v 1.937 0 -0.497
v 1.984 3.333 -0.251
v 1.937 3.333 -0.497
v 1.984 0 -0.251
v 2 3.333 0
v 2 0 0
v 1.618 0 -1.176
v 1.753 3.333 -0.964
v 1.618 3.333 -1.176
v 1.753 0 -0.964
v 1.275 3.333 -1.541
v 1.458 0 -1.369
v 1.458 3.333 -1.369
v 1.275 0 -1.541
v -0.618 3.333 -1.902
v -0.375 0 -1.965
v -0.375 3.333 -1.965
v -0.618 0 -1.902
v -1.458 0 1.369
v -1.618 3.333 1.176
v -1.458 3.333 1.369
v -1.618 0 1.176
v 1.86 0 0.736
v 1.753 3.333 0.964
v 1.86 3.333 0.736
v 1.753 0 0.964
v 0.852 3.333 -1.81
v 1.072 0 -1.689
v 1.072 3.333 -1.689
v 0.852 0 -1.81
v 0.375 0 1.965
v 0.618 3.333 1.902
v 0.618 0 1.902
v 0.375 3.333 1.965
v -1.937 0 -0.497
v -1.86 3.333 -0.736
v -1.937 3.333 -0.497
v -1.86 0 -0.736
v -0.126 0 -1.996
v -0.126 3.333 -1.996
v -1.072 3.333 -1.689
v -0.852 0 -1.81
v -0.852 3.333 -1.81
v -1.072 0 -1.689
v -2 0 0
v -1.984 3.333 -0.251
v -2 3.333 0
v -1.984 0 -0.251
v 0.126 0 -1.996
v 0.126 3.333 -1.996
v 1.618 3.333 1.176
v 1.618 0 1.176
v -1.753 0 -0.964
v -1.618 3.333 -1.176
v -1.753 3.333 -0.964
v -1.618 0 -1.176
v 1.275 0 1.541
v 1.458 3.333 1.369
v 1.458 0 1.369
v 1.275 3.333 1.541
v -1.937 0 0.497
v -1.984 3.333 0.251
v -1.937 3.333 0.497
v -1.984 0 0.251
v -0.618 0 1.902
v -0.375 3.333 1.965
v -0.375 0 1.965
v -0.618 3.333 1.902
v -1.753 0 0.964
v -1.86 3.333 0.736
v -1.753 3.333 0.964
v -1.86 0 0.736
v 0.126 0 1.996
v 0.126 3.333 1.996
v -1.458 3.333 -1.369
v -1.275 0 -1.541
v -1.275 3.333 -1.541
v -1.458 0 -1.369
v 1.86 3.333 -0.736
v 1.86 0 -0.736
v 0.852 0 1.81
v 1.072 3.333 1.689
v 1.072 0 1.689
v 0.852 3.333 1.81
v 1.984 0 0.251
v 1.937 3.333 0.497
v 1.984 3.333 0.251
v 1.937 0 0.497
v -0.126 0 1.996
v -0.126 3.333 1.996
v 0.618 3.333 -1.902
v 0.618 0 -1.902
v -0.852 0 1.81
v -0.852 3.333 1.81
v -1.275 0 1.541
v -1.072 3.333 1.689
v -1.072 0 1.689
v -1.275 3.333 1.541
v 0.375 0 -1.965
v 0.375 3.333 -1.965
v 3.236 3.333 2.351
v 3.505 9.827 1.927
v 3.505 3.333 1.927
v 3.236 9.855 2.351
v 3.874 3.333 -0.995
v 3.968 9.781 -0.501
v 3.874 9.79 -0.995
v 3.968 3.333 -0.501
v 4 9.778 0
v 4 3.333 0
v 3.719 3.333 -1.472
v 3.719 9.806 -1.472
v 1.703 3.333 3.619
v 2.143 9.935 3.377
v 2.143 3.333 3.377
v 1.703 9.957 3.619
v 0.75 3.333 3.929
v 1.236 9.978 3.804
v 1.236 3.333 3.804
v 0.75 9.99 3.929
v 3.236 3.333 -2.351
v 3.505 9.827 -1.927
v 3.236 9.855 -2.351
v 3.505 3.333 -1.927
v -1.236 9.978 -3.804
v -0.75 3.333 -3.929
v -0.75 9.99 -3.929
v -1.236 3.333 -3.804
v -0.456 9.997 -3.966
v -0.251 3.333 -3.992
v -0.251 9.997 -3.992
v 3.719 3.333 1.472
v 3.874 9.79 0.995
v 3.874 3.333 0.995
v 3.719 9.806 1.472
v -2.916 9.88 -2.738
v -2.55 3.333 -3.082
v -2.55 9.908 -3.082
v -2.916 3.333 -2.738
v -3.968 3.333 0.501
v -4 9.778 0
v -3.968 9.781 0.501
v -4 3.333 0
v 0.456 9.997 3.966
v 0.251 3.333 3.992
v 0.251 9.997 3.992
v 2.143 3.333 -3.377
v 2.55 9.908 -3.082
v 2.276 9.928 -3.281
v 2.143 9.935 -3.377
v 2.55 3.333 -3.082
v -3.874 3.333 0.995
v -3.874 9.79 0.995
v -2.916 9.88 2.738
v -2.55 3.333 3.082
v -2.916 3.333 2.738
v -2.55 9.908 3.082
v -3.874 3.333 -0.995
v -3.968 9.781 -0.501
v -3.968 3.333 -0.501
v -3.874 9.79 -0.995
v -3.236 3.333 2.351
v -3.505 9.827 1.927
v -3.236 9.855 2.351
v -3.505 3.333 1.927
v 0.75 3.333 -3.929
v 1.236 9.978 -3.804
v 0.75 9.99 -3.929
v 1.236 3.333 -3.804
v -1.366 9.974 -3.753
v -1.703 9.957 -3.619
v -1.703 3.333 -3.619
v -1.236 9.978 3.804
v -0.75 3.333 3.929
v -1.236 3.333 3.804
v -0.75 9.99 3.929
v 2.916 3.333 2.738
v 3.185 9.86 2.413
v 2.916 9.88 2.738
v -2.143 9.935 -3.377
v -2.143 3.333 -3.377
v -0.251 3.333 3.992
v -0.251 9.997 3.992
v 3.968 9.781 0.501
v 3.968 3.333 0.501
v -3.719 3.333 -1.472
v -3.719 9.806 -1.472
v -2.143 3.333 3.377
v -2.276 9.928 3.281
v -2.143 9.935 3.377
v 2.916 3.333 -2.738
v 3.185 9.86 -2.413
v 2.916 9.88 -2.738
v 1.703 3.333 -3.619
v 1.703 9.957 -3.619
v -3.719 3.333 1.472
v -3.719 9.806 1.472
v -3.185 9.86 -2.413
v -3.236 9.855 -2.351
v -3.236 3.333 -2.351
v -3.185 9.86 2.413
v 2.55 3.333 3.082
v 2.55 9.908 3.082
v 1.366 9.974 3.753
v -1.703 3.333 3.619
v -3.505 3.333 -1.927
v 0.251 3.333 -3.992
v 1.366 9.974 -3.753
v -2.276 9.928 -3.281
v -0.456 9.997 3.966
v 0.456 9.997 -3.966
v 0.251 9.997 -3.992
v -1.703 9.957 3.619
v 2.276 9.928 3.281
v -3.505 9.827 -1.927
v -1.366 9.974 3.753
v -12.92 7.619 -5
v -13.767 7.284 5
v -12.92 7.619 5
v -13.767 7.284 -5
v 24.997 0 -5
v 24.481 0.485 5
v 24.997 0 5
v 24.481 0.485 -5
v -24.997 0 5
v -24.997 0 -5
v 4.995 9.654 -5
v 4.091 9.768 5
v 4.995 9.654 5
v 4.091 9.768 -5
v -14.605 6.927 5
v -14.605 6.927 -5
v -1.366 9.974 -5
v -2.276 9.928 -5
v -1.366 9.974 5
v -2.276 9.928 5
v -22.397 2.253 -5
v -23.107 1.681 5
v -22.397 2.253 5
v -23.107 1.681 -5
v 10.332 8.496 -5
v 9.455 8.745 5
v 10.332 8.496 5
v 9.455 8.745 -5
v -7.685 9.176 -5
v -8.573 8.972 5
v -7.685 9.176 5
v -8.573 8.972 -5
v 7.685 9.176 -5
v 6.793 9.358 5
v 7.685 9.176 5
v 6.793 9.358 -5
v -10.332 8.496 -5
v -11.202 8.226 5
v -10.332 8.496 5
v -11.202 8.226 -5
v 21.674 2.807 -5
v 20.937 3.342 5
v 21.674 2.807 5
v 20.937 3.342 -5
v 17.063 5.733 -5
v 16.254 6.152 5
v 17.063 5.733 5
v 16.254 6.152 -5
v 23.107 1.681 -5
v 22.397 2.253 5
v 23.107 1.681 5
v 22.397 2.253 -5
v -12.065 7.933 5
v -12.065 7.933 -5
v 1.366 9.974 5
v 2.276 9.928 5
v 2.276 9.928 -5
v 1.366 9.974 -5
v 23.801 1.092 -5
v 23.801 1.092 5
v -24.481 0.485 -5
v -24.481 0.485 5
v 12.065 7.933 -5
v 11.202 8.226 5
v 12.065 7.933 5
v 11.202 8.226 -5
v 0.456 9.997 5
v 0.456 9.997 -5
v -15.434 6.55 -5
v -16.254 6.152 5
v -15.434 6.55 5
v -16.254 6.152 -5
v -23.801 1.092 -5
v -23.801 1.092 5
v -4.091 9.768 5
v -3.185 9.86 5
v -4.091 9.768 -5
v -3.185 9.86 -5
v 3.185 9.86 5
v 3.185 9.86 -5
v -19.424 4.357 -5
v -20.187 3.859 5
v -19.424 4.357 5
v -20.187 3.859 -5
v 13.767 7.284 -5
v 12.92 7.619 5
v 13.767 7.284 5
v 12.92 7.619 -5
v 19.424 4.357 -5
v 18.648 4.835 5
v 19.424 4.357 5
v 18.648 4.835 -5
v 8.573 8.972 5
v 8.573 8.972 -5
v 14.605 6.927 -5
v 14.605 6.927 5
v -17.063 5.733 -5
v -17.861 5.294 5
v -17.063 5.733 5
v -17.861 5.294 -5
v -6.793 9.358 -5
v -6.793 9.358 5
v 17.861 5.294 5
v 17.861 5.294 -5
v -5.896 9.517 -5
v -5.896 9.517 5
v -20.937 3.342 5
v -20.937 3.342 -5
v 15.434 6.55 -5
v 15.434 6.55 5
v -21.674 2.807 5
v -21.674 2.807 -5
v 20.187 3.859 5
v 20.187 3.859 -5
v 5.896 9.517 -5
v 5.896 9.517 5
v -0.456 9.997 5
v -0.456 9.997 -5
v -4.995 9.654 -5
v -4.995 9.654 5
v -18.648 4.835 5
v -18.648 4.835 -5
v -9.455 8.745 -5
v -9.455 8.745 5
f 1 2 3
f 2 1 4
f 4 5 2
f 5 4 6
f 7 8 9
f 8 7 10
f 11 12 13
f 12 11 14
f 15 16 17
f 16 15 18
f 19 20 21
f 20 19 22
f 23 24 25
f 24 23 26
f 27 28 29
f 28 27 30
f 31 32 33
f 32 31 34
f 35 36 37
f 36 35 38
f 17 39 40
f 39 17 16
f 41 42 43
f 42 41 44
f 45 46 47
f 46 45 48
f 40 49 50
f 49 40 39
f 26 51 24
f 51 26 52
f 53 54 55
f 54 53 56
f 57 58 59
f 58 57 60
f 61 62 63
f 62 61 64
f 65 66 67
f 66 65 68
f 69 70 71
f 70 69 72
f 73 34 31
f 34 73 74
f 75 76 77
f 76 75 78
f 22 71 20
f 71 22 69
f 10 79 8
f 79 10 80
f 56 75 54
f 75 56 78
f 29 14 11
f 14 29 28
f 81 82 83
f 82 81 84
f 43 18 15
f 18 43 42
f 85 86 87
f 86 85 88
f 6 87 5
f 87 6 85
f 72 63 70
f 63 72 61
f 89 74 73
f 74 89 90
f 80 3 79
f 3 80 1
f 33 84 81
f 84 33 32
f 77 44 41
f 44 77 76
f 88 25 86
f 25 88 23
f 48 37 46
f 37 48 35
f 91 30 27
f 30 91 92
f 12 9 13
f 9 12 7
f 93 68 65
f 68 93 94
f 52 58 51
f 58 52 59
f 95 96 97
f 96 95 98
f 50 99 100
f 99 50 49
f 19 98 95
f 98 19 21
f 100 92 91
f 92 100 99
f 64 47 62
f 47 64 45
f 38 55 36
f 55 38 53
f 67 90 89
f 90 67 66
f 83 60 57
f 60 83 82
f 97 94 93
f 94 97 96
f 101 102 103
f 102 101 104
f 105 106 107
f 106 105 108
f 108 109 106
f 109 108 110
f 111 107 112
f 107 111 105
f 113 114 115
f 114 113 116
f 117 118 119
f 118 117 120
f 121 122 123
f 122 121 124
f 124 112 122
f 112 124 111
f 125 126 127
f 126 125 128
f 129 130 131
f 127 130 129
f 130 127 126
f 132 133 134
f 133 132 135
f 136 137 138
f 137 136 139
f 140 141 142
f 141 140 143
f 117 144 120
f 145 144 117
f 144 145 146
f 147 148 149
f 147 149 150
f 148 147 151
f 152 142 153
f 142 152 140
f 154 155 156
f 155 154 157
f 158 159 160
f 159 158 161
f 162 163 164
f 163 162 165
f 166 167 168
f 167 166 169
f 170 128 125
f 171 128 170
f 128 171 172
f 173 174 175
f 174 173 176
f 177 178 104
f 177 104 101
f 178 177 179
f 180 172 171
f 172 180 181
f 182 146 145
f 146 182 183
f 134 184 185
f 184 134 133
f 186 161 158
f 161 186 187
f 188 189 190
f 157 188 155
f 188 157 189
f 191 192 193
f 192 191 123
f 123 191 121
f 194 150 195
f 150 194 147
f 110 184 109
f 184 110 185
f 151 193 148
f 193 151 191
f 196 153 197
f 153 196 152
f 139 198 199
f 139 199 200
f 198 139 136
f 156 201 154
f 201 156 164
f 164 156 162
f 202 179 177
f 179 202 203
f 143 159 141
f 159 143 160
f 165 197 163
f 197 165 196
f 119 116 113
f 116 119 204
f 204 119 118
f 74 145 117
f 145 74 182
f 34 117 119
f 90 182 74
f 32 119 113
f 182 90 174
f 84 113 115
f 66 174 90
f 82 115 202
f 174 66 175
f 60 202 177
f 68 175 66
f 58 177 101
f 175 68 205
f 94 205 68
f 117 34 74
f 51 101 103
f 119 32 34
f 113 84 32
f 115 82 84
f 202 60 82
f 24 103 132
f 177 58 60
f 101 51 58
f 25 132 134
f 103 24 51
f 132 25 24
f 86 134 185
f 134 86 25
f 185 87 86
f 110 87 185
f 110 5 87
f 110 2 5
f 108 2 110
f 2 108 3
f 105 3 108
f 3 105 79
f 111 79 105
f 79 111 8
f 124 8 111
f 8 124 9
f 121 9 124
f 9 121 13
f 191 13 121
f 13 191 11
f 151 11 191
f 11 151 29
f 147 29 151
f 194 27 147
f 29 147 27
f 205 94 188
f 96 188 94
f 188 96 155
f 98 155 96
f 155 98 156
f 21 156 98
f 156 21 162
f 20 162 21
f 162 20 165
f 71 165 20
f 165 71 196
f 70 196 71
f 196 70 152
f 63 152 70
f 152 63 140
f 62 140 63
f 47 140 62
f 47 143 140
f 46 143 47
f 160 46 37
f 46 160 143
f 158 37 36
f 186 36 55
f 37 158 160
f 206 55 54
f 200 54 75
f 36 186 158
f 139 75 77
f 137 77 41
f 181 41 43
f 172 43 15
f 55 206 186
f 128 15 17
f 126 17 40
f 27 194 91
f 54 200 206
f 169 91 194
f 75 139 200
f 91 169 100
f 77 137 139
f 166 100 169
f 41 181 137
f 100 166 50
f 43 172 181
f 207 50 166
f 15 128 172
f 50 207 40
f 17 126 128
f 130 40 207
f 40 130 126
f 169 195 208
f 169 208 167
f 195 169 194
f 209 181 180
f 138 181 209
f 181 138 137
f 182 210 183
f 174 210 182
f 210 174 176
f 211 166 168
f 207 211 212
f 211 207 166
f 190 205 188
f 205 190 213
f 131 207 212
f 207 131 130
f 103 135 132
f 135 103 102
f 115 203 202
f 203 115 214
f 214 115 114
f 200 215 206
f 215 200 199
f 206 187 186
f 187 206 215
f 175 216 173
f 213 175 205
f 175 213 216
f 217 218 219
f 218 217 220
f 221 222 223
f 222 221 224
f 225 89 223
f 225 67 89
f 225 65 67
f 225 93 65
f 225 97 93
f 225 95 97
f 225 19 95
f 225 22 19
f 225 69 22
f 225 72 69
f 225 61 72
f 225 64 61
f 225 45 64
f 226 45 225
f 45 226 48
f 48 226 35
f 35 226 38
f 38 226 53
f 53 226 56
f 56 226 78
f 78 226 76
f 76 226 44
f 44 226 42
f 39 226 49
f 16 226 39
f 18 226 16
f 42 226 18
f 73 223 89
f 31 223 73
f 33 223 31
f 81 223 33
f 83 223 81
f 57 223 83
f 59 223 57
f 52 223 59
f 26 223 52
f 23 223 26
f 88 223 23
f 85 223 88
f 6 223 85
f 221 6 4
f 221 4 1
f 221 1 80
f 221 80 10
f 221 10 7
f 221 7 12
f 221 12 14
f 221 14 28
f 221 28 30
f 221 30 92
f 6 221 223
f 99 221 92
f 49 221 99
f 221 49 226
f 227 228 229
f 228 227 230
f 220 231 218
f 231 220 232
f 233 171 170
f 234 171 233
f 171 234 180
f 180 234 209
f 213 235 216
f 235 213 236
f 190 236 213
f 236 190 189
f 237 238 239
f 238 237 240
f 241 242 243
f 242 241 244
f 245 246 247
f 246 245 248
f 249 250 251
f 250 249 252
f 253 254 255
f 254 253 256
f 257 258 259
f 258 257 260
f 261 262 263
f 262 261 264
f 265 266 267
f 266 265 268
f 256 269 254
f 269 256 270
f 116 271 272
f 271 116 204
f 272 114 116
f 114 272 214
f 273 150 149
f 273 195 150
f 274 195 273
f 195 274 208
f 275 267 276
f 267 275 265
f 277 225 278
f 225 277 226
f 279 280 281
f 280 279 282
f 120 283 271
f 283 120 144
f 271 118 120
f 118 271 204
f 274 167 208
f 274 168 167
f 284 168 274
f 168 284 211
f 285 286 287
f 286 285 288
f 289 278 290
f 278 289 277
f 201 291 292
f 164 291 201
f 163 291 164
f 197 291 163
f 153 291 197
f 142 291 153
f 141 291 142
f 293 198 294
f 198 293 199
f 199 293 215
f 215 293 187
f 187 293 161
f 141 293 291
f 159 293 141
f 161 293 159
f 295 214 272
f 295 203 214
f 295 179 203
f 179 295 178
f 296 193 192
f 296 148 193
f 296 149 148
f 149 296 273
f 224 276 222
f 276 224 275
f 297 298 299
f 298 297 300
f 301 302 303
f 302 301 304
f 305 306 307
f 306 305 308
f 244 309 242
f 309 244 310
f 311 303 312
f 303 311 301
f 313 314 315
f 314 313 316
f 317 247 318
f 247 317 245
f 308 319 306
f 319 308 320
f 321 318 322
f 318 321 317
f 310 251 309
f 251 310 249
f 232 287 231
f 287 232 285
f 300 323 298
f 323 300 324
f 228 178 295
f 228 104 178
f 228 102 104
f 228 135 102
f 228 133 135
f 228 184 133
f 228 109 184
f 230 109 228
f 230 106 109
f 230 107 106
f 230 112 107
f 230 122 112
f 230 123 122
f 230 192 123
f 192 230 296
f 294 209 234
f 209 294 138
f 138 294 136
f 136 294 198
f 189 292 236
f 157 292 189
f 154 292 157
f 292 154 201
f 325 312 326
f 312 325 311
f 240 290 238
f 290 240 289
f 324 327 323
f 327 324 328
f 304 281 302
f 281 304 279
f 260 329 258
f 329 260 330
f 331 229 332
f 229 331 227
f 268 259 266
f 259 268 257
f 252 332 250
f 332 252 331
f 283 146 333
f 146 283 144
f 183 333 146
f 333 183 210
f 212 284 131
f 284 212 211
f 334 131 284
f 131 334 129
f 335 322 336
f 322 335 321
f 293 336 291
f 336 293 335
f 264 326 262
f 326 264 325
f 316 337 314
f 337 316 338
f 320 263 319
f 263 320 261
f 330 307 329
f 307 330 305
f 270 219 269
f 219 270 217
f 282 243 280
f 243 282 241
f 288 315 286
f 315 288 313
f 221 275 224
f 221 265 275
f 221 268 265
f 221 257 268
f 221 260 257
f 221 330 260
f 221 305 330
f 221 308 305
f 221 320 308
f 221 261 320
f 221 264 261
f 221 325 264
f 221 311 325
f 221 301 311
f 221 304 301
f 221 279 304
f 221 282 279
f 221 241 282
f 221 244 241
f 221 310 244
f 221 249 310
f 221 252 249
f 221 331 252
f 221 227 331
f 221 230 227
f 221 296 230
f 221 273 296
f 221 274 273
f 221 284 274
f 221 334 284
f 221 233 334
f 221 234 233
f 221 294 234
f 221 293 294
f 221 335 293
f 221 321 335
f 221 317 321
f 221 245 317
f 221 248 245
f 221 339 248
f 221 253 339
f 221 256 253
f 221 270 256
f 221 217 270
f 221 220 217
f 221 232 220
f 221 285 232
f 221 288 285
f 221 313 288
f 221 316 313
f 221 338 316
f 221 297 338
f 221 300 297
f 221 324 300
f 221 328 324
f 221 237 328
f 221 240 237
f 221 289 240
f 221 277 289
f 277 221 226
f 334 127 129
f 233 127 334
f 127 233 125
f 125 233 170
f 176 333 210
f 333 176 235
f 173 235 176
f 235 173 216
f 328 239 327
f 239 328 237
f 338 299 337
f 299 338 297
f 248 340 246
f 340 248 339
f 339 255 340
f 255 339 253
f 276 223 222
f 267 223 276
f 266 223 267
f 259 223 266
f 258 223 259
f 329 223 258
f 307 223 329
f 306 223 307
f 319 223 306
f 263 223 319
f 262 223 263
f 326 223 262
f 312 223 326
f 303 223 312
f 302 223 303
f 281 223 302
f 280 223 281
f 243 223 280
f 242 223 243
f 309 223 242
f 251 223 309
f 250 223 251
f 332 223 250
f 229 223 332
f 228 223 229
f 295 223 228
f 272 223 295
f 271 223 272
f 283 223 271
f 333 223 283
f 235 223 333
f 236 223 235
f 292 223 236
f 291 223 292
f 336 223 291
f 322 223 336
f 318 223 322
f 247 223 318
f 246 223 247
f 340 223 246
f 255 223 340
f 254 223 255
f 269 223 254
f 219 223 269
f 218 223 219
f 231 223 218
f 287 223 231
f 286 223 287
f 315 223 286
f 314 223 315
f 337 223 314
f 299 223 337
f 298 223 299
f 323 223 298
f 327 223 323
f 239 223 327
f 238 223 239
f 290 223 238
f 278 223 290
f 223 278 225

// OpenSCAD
// Circular segment params
// https://en.wikipedia.org/wiki/Circular_segment
c = 50;
h = 10;

R = h/2 + (c*c) / (8*h);
d = R - h;

// 

THICKNESS = 10;

SCREW_R = 4/2;
NUT_R = 8/2;

difference () {
    translate ([0, 0, -THICKNESS/2]) linear_extrude (THICKNESS) {
        intersection () {
            translate ([0, -d]) circle(r=R, $fn=250);
            translate ([-R, 0]) square([R*2, R]);
        }
    }
    rotate ([-90, 0, 0]) {
        $fn=50;
        translate ([0, 0, -1]) cylinder (100, r=SCREW_R);
        translate ([0, 0, h/3]) cylinder (100, r=NUT_R);
    }
}
